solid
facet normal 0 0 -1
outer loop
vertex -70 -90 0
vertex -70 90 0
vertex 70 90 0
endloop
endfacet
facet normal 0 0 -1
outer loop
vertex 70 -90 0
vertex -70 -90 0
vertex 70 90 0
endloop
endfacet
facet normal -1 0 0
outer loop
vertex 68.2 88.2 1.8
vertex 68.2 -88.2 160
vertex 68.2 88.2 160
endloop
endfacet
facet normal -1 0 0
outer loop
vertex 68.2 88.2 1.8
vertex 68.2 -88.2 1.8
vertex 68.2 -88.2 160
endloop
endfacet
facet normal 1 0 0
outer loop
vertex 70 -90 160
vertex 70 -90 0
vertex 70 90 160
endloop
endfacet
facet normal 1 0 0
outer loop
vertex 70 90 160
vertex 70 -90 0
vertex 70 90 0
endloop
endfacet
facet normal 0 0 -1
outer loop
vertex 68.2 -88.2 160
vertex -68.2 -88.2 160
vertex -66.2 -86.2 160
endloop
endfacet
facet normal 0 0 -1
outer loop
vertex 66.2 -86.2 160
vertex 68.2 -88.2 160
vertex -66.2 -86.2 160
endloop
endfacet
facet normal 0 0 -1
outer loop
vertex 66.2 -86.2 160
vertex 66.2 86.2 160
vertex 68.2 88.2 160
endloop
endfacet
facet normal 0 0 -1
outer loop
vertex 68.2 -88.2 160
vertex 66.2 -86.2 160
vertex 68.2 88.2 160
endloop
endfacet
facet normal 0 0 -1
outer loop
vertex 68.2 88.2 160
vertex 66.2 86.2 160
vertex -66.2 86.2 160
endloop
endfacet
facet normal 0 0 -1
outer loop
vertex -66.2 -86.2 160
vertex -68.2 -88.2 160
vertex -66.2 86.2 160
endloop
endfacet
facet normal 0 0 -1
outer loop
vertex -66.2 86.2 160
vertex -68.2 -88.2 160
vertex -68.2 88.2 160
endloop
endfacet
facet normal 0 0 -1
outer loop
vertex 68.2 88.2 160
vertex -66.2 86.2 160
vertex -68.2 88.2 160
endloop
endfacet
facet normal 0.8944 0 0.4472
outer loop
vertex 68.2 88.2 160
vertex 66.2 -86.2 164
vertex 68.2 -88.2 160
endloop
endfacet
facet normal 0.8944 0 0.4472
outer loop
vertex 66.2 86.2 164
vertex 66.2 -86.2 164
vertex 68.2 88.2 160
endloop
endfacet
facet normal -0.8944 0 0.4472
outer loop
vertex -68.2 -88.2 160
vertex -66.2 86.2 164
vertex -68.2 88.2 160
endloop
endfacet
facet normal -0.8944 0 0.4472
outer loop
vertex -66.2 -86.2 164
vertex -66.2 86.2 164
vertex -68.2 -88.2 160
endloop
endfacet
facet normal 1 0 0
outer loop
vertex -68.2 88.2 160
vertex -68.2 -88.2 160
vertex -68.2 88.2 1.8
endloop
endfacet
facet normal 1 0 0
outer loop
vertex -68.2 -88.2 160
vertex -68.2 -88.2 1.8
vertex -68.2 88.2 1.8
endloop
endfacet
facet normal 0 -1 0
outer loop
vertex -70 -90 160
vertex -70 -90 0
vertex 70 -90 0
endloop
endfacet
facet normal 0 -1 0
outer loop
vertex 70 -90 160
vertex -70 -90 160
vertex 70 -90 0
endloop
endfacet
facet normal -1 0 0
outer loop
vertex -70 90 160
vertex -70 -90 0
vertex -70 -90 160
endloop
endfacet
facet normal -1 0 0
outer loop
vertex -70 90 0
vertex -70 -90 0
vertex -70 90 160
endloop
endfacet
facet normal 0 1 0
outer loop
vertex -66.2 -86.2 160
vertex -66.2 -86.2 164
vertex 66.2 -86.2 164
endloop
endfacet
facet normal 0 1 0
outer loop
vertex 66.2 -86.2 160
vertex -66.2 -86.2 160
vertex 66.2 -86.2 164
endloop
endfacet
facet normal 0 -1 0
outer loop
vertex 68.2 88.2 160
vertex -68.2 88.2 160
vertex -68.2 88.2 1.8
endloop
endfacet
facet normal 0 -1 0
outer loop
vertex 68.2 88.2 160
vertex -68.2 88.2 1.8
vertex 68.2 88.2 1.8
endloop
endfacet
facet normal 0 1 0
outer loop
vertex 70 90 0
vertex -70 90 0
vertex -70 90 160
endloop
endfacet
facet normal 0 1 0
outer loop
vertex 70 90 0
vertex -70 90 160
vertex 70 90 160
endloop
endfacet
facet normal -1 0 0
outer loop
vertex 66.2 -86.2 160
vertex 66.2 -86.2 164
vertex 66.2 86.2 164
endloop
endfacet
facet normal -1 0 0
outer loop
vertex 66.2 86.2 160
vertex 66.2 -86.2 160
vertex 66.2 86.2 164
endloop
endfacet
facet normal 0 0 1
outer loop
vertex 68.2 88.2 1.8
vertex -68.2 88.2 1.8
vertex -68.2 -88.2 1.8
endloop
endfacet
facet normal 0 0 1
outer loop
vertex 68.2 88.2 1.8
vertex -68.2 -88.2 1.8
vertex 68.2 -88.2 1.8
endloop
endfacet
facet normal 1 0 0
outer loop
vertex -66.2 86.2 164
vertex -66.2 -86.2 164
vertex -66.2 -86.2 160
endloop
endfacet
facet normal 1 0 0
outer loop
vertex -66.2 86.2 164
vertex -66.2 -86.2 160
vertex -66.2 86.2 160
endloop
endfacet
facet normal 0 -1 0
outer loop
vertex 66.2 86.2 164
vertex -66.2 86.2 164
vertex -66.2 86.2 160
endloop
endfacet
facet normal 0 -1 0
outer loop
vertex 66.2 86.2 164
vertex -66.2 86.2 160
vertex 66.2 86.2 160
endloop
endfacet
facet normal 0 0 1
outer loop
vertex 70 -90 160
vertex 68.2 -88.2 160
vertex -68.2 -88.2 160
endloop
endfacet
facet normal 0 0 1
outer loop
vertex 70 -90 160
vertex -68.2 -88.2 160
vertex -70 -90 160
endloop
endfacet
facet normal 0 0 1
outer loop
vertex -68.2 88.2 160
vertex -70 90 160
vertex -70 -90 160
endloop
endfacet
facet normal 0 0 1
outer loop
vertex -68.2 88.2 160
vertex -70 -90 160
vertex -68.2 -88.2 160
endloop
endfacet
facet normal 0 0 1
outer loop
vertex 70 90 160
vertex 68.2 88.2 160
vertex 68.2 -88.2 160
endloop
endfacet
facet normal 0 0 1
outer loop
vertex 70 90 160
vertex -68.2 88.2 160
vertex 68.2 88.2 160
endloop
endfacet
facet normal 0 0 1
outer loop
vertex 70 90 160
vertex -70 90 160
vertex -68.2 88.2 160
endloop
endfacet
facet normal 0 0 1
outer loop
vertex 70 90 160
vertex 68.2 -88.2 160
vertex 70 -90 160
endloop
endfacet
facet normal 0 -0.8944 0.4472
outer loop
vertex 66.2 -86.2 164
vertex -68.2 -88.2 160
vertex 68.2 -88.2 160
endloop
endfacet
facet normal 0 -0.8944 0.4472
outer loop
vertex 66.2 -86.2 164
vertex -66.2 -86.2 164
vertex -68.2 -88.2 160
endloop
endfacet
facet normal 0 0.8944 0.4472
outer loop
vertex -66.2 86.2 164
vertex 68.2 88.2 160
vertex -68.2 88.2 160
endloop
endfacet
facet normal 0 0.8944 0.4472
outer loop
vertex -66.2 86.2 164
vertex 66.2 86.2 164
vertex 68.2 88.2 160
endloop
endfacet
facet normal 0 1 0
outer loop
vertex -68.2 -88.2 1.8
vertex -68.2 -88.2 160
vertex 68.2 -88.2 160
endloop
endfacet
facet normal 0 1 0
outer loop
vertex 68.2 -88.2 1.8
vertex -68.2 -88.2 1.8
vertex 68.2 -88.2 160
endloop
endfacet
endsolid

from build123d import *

# Parameters (mm, degrees)
F0_W     = 140
F0_H     = 180
F1_DEPTH = 160
F2_T     = -1.8
F3_W     = 136.4
F3_H     = 176.4
F5_W     = 132.4
F5_H     = 172.4
F8_DEPTH = 25


# Not quite as in the source:
# - the program builds the solid bodies; features that only make, move or delete a surface that nothing else refers to are left out


with BuildPart() as f1:
    # F0 (on Top) → F1 (new body)
    with BuildSketch(Plane.XY):
        Rectangle(F0_W, F0_H)
    extrude(amount=F1_DEPTH)

    # F2
    f2_openings = [f1.faces().sort_by_distance(p)[0] for p in [
        (0, 0, 160),
    ]]
    offset(amount=F2_T, openings=f2_openings)


with BuildPart() as f7:
    # F3 (on face) → F7 section 0
    with BuildSketch(Plane.XY.offset(160)):
        Rectangle(F3_W, F3_H)
    # F5 (on offset) → F7 section 1
    with BuildSketch(Plane.XY.offset(164)):
        Rectangle(F5_W, F5_H)
    loft()

    # F5 (on offset) → F8 (cut)
    with BuildSketch(Plane.XY.offset(164)):
        Rectangle(F5_W, F5_H)
    extrude(amount=-F8_DEPTH, mode=Mode.SUBTRACT)


solid = Compound([f1.part, f7.part])
